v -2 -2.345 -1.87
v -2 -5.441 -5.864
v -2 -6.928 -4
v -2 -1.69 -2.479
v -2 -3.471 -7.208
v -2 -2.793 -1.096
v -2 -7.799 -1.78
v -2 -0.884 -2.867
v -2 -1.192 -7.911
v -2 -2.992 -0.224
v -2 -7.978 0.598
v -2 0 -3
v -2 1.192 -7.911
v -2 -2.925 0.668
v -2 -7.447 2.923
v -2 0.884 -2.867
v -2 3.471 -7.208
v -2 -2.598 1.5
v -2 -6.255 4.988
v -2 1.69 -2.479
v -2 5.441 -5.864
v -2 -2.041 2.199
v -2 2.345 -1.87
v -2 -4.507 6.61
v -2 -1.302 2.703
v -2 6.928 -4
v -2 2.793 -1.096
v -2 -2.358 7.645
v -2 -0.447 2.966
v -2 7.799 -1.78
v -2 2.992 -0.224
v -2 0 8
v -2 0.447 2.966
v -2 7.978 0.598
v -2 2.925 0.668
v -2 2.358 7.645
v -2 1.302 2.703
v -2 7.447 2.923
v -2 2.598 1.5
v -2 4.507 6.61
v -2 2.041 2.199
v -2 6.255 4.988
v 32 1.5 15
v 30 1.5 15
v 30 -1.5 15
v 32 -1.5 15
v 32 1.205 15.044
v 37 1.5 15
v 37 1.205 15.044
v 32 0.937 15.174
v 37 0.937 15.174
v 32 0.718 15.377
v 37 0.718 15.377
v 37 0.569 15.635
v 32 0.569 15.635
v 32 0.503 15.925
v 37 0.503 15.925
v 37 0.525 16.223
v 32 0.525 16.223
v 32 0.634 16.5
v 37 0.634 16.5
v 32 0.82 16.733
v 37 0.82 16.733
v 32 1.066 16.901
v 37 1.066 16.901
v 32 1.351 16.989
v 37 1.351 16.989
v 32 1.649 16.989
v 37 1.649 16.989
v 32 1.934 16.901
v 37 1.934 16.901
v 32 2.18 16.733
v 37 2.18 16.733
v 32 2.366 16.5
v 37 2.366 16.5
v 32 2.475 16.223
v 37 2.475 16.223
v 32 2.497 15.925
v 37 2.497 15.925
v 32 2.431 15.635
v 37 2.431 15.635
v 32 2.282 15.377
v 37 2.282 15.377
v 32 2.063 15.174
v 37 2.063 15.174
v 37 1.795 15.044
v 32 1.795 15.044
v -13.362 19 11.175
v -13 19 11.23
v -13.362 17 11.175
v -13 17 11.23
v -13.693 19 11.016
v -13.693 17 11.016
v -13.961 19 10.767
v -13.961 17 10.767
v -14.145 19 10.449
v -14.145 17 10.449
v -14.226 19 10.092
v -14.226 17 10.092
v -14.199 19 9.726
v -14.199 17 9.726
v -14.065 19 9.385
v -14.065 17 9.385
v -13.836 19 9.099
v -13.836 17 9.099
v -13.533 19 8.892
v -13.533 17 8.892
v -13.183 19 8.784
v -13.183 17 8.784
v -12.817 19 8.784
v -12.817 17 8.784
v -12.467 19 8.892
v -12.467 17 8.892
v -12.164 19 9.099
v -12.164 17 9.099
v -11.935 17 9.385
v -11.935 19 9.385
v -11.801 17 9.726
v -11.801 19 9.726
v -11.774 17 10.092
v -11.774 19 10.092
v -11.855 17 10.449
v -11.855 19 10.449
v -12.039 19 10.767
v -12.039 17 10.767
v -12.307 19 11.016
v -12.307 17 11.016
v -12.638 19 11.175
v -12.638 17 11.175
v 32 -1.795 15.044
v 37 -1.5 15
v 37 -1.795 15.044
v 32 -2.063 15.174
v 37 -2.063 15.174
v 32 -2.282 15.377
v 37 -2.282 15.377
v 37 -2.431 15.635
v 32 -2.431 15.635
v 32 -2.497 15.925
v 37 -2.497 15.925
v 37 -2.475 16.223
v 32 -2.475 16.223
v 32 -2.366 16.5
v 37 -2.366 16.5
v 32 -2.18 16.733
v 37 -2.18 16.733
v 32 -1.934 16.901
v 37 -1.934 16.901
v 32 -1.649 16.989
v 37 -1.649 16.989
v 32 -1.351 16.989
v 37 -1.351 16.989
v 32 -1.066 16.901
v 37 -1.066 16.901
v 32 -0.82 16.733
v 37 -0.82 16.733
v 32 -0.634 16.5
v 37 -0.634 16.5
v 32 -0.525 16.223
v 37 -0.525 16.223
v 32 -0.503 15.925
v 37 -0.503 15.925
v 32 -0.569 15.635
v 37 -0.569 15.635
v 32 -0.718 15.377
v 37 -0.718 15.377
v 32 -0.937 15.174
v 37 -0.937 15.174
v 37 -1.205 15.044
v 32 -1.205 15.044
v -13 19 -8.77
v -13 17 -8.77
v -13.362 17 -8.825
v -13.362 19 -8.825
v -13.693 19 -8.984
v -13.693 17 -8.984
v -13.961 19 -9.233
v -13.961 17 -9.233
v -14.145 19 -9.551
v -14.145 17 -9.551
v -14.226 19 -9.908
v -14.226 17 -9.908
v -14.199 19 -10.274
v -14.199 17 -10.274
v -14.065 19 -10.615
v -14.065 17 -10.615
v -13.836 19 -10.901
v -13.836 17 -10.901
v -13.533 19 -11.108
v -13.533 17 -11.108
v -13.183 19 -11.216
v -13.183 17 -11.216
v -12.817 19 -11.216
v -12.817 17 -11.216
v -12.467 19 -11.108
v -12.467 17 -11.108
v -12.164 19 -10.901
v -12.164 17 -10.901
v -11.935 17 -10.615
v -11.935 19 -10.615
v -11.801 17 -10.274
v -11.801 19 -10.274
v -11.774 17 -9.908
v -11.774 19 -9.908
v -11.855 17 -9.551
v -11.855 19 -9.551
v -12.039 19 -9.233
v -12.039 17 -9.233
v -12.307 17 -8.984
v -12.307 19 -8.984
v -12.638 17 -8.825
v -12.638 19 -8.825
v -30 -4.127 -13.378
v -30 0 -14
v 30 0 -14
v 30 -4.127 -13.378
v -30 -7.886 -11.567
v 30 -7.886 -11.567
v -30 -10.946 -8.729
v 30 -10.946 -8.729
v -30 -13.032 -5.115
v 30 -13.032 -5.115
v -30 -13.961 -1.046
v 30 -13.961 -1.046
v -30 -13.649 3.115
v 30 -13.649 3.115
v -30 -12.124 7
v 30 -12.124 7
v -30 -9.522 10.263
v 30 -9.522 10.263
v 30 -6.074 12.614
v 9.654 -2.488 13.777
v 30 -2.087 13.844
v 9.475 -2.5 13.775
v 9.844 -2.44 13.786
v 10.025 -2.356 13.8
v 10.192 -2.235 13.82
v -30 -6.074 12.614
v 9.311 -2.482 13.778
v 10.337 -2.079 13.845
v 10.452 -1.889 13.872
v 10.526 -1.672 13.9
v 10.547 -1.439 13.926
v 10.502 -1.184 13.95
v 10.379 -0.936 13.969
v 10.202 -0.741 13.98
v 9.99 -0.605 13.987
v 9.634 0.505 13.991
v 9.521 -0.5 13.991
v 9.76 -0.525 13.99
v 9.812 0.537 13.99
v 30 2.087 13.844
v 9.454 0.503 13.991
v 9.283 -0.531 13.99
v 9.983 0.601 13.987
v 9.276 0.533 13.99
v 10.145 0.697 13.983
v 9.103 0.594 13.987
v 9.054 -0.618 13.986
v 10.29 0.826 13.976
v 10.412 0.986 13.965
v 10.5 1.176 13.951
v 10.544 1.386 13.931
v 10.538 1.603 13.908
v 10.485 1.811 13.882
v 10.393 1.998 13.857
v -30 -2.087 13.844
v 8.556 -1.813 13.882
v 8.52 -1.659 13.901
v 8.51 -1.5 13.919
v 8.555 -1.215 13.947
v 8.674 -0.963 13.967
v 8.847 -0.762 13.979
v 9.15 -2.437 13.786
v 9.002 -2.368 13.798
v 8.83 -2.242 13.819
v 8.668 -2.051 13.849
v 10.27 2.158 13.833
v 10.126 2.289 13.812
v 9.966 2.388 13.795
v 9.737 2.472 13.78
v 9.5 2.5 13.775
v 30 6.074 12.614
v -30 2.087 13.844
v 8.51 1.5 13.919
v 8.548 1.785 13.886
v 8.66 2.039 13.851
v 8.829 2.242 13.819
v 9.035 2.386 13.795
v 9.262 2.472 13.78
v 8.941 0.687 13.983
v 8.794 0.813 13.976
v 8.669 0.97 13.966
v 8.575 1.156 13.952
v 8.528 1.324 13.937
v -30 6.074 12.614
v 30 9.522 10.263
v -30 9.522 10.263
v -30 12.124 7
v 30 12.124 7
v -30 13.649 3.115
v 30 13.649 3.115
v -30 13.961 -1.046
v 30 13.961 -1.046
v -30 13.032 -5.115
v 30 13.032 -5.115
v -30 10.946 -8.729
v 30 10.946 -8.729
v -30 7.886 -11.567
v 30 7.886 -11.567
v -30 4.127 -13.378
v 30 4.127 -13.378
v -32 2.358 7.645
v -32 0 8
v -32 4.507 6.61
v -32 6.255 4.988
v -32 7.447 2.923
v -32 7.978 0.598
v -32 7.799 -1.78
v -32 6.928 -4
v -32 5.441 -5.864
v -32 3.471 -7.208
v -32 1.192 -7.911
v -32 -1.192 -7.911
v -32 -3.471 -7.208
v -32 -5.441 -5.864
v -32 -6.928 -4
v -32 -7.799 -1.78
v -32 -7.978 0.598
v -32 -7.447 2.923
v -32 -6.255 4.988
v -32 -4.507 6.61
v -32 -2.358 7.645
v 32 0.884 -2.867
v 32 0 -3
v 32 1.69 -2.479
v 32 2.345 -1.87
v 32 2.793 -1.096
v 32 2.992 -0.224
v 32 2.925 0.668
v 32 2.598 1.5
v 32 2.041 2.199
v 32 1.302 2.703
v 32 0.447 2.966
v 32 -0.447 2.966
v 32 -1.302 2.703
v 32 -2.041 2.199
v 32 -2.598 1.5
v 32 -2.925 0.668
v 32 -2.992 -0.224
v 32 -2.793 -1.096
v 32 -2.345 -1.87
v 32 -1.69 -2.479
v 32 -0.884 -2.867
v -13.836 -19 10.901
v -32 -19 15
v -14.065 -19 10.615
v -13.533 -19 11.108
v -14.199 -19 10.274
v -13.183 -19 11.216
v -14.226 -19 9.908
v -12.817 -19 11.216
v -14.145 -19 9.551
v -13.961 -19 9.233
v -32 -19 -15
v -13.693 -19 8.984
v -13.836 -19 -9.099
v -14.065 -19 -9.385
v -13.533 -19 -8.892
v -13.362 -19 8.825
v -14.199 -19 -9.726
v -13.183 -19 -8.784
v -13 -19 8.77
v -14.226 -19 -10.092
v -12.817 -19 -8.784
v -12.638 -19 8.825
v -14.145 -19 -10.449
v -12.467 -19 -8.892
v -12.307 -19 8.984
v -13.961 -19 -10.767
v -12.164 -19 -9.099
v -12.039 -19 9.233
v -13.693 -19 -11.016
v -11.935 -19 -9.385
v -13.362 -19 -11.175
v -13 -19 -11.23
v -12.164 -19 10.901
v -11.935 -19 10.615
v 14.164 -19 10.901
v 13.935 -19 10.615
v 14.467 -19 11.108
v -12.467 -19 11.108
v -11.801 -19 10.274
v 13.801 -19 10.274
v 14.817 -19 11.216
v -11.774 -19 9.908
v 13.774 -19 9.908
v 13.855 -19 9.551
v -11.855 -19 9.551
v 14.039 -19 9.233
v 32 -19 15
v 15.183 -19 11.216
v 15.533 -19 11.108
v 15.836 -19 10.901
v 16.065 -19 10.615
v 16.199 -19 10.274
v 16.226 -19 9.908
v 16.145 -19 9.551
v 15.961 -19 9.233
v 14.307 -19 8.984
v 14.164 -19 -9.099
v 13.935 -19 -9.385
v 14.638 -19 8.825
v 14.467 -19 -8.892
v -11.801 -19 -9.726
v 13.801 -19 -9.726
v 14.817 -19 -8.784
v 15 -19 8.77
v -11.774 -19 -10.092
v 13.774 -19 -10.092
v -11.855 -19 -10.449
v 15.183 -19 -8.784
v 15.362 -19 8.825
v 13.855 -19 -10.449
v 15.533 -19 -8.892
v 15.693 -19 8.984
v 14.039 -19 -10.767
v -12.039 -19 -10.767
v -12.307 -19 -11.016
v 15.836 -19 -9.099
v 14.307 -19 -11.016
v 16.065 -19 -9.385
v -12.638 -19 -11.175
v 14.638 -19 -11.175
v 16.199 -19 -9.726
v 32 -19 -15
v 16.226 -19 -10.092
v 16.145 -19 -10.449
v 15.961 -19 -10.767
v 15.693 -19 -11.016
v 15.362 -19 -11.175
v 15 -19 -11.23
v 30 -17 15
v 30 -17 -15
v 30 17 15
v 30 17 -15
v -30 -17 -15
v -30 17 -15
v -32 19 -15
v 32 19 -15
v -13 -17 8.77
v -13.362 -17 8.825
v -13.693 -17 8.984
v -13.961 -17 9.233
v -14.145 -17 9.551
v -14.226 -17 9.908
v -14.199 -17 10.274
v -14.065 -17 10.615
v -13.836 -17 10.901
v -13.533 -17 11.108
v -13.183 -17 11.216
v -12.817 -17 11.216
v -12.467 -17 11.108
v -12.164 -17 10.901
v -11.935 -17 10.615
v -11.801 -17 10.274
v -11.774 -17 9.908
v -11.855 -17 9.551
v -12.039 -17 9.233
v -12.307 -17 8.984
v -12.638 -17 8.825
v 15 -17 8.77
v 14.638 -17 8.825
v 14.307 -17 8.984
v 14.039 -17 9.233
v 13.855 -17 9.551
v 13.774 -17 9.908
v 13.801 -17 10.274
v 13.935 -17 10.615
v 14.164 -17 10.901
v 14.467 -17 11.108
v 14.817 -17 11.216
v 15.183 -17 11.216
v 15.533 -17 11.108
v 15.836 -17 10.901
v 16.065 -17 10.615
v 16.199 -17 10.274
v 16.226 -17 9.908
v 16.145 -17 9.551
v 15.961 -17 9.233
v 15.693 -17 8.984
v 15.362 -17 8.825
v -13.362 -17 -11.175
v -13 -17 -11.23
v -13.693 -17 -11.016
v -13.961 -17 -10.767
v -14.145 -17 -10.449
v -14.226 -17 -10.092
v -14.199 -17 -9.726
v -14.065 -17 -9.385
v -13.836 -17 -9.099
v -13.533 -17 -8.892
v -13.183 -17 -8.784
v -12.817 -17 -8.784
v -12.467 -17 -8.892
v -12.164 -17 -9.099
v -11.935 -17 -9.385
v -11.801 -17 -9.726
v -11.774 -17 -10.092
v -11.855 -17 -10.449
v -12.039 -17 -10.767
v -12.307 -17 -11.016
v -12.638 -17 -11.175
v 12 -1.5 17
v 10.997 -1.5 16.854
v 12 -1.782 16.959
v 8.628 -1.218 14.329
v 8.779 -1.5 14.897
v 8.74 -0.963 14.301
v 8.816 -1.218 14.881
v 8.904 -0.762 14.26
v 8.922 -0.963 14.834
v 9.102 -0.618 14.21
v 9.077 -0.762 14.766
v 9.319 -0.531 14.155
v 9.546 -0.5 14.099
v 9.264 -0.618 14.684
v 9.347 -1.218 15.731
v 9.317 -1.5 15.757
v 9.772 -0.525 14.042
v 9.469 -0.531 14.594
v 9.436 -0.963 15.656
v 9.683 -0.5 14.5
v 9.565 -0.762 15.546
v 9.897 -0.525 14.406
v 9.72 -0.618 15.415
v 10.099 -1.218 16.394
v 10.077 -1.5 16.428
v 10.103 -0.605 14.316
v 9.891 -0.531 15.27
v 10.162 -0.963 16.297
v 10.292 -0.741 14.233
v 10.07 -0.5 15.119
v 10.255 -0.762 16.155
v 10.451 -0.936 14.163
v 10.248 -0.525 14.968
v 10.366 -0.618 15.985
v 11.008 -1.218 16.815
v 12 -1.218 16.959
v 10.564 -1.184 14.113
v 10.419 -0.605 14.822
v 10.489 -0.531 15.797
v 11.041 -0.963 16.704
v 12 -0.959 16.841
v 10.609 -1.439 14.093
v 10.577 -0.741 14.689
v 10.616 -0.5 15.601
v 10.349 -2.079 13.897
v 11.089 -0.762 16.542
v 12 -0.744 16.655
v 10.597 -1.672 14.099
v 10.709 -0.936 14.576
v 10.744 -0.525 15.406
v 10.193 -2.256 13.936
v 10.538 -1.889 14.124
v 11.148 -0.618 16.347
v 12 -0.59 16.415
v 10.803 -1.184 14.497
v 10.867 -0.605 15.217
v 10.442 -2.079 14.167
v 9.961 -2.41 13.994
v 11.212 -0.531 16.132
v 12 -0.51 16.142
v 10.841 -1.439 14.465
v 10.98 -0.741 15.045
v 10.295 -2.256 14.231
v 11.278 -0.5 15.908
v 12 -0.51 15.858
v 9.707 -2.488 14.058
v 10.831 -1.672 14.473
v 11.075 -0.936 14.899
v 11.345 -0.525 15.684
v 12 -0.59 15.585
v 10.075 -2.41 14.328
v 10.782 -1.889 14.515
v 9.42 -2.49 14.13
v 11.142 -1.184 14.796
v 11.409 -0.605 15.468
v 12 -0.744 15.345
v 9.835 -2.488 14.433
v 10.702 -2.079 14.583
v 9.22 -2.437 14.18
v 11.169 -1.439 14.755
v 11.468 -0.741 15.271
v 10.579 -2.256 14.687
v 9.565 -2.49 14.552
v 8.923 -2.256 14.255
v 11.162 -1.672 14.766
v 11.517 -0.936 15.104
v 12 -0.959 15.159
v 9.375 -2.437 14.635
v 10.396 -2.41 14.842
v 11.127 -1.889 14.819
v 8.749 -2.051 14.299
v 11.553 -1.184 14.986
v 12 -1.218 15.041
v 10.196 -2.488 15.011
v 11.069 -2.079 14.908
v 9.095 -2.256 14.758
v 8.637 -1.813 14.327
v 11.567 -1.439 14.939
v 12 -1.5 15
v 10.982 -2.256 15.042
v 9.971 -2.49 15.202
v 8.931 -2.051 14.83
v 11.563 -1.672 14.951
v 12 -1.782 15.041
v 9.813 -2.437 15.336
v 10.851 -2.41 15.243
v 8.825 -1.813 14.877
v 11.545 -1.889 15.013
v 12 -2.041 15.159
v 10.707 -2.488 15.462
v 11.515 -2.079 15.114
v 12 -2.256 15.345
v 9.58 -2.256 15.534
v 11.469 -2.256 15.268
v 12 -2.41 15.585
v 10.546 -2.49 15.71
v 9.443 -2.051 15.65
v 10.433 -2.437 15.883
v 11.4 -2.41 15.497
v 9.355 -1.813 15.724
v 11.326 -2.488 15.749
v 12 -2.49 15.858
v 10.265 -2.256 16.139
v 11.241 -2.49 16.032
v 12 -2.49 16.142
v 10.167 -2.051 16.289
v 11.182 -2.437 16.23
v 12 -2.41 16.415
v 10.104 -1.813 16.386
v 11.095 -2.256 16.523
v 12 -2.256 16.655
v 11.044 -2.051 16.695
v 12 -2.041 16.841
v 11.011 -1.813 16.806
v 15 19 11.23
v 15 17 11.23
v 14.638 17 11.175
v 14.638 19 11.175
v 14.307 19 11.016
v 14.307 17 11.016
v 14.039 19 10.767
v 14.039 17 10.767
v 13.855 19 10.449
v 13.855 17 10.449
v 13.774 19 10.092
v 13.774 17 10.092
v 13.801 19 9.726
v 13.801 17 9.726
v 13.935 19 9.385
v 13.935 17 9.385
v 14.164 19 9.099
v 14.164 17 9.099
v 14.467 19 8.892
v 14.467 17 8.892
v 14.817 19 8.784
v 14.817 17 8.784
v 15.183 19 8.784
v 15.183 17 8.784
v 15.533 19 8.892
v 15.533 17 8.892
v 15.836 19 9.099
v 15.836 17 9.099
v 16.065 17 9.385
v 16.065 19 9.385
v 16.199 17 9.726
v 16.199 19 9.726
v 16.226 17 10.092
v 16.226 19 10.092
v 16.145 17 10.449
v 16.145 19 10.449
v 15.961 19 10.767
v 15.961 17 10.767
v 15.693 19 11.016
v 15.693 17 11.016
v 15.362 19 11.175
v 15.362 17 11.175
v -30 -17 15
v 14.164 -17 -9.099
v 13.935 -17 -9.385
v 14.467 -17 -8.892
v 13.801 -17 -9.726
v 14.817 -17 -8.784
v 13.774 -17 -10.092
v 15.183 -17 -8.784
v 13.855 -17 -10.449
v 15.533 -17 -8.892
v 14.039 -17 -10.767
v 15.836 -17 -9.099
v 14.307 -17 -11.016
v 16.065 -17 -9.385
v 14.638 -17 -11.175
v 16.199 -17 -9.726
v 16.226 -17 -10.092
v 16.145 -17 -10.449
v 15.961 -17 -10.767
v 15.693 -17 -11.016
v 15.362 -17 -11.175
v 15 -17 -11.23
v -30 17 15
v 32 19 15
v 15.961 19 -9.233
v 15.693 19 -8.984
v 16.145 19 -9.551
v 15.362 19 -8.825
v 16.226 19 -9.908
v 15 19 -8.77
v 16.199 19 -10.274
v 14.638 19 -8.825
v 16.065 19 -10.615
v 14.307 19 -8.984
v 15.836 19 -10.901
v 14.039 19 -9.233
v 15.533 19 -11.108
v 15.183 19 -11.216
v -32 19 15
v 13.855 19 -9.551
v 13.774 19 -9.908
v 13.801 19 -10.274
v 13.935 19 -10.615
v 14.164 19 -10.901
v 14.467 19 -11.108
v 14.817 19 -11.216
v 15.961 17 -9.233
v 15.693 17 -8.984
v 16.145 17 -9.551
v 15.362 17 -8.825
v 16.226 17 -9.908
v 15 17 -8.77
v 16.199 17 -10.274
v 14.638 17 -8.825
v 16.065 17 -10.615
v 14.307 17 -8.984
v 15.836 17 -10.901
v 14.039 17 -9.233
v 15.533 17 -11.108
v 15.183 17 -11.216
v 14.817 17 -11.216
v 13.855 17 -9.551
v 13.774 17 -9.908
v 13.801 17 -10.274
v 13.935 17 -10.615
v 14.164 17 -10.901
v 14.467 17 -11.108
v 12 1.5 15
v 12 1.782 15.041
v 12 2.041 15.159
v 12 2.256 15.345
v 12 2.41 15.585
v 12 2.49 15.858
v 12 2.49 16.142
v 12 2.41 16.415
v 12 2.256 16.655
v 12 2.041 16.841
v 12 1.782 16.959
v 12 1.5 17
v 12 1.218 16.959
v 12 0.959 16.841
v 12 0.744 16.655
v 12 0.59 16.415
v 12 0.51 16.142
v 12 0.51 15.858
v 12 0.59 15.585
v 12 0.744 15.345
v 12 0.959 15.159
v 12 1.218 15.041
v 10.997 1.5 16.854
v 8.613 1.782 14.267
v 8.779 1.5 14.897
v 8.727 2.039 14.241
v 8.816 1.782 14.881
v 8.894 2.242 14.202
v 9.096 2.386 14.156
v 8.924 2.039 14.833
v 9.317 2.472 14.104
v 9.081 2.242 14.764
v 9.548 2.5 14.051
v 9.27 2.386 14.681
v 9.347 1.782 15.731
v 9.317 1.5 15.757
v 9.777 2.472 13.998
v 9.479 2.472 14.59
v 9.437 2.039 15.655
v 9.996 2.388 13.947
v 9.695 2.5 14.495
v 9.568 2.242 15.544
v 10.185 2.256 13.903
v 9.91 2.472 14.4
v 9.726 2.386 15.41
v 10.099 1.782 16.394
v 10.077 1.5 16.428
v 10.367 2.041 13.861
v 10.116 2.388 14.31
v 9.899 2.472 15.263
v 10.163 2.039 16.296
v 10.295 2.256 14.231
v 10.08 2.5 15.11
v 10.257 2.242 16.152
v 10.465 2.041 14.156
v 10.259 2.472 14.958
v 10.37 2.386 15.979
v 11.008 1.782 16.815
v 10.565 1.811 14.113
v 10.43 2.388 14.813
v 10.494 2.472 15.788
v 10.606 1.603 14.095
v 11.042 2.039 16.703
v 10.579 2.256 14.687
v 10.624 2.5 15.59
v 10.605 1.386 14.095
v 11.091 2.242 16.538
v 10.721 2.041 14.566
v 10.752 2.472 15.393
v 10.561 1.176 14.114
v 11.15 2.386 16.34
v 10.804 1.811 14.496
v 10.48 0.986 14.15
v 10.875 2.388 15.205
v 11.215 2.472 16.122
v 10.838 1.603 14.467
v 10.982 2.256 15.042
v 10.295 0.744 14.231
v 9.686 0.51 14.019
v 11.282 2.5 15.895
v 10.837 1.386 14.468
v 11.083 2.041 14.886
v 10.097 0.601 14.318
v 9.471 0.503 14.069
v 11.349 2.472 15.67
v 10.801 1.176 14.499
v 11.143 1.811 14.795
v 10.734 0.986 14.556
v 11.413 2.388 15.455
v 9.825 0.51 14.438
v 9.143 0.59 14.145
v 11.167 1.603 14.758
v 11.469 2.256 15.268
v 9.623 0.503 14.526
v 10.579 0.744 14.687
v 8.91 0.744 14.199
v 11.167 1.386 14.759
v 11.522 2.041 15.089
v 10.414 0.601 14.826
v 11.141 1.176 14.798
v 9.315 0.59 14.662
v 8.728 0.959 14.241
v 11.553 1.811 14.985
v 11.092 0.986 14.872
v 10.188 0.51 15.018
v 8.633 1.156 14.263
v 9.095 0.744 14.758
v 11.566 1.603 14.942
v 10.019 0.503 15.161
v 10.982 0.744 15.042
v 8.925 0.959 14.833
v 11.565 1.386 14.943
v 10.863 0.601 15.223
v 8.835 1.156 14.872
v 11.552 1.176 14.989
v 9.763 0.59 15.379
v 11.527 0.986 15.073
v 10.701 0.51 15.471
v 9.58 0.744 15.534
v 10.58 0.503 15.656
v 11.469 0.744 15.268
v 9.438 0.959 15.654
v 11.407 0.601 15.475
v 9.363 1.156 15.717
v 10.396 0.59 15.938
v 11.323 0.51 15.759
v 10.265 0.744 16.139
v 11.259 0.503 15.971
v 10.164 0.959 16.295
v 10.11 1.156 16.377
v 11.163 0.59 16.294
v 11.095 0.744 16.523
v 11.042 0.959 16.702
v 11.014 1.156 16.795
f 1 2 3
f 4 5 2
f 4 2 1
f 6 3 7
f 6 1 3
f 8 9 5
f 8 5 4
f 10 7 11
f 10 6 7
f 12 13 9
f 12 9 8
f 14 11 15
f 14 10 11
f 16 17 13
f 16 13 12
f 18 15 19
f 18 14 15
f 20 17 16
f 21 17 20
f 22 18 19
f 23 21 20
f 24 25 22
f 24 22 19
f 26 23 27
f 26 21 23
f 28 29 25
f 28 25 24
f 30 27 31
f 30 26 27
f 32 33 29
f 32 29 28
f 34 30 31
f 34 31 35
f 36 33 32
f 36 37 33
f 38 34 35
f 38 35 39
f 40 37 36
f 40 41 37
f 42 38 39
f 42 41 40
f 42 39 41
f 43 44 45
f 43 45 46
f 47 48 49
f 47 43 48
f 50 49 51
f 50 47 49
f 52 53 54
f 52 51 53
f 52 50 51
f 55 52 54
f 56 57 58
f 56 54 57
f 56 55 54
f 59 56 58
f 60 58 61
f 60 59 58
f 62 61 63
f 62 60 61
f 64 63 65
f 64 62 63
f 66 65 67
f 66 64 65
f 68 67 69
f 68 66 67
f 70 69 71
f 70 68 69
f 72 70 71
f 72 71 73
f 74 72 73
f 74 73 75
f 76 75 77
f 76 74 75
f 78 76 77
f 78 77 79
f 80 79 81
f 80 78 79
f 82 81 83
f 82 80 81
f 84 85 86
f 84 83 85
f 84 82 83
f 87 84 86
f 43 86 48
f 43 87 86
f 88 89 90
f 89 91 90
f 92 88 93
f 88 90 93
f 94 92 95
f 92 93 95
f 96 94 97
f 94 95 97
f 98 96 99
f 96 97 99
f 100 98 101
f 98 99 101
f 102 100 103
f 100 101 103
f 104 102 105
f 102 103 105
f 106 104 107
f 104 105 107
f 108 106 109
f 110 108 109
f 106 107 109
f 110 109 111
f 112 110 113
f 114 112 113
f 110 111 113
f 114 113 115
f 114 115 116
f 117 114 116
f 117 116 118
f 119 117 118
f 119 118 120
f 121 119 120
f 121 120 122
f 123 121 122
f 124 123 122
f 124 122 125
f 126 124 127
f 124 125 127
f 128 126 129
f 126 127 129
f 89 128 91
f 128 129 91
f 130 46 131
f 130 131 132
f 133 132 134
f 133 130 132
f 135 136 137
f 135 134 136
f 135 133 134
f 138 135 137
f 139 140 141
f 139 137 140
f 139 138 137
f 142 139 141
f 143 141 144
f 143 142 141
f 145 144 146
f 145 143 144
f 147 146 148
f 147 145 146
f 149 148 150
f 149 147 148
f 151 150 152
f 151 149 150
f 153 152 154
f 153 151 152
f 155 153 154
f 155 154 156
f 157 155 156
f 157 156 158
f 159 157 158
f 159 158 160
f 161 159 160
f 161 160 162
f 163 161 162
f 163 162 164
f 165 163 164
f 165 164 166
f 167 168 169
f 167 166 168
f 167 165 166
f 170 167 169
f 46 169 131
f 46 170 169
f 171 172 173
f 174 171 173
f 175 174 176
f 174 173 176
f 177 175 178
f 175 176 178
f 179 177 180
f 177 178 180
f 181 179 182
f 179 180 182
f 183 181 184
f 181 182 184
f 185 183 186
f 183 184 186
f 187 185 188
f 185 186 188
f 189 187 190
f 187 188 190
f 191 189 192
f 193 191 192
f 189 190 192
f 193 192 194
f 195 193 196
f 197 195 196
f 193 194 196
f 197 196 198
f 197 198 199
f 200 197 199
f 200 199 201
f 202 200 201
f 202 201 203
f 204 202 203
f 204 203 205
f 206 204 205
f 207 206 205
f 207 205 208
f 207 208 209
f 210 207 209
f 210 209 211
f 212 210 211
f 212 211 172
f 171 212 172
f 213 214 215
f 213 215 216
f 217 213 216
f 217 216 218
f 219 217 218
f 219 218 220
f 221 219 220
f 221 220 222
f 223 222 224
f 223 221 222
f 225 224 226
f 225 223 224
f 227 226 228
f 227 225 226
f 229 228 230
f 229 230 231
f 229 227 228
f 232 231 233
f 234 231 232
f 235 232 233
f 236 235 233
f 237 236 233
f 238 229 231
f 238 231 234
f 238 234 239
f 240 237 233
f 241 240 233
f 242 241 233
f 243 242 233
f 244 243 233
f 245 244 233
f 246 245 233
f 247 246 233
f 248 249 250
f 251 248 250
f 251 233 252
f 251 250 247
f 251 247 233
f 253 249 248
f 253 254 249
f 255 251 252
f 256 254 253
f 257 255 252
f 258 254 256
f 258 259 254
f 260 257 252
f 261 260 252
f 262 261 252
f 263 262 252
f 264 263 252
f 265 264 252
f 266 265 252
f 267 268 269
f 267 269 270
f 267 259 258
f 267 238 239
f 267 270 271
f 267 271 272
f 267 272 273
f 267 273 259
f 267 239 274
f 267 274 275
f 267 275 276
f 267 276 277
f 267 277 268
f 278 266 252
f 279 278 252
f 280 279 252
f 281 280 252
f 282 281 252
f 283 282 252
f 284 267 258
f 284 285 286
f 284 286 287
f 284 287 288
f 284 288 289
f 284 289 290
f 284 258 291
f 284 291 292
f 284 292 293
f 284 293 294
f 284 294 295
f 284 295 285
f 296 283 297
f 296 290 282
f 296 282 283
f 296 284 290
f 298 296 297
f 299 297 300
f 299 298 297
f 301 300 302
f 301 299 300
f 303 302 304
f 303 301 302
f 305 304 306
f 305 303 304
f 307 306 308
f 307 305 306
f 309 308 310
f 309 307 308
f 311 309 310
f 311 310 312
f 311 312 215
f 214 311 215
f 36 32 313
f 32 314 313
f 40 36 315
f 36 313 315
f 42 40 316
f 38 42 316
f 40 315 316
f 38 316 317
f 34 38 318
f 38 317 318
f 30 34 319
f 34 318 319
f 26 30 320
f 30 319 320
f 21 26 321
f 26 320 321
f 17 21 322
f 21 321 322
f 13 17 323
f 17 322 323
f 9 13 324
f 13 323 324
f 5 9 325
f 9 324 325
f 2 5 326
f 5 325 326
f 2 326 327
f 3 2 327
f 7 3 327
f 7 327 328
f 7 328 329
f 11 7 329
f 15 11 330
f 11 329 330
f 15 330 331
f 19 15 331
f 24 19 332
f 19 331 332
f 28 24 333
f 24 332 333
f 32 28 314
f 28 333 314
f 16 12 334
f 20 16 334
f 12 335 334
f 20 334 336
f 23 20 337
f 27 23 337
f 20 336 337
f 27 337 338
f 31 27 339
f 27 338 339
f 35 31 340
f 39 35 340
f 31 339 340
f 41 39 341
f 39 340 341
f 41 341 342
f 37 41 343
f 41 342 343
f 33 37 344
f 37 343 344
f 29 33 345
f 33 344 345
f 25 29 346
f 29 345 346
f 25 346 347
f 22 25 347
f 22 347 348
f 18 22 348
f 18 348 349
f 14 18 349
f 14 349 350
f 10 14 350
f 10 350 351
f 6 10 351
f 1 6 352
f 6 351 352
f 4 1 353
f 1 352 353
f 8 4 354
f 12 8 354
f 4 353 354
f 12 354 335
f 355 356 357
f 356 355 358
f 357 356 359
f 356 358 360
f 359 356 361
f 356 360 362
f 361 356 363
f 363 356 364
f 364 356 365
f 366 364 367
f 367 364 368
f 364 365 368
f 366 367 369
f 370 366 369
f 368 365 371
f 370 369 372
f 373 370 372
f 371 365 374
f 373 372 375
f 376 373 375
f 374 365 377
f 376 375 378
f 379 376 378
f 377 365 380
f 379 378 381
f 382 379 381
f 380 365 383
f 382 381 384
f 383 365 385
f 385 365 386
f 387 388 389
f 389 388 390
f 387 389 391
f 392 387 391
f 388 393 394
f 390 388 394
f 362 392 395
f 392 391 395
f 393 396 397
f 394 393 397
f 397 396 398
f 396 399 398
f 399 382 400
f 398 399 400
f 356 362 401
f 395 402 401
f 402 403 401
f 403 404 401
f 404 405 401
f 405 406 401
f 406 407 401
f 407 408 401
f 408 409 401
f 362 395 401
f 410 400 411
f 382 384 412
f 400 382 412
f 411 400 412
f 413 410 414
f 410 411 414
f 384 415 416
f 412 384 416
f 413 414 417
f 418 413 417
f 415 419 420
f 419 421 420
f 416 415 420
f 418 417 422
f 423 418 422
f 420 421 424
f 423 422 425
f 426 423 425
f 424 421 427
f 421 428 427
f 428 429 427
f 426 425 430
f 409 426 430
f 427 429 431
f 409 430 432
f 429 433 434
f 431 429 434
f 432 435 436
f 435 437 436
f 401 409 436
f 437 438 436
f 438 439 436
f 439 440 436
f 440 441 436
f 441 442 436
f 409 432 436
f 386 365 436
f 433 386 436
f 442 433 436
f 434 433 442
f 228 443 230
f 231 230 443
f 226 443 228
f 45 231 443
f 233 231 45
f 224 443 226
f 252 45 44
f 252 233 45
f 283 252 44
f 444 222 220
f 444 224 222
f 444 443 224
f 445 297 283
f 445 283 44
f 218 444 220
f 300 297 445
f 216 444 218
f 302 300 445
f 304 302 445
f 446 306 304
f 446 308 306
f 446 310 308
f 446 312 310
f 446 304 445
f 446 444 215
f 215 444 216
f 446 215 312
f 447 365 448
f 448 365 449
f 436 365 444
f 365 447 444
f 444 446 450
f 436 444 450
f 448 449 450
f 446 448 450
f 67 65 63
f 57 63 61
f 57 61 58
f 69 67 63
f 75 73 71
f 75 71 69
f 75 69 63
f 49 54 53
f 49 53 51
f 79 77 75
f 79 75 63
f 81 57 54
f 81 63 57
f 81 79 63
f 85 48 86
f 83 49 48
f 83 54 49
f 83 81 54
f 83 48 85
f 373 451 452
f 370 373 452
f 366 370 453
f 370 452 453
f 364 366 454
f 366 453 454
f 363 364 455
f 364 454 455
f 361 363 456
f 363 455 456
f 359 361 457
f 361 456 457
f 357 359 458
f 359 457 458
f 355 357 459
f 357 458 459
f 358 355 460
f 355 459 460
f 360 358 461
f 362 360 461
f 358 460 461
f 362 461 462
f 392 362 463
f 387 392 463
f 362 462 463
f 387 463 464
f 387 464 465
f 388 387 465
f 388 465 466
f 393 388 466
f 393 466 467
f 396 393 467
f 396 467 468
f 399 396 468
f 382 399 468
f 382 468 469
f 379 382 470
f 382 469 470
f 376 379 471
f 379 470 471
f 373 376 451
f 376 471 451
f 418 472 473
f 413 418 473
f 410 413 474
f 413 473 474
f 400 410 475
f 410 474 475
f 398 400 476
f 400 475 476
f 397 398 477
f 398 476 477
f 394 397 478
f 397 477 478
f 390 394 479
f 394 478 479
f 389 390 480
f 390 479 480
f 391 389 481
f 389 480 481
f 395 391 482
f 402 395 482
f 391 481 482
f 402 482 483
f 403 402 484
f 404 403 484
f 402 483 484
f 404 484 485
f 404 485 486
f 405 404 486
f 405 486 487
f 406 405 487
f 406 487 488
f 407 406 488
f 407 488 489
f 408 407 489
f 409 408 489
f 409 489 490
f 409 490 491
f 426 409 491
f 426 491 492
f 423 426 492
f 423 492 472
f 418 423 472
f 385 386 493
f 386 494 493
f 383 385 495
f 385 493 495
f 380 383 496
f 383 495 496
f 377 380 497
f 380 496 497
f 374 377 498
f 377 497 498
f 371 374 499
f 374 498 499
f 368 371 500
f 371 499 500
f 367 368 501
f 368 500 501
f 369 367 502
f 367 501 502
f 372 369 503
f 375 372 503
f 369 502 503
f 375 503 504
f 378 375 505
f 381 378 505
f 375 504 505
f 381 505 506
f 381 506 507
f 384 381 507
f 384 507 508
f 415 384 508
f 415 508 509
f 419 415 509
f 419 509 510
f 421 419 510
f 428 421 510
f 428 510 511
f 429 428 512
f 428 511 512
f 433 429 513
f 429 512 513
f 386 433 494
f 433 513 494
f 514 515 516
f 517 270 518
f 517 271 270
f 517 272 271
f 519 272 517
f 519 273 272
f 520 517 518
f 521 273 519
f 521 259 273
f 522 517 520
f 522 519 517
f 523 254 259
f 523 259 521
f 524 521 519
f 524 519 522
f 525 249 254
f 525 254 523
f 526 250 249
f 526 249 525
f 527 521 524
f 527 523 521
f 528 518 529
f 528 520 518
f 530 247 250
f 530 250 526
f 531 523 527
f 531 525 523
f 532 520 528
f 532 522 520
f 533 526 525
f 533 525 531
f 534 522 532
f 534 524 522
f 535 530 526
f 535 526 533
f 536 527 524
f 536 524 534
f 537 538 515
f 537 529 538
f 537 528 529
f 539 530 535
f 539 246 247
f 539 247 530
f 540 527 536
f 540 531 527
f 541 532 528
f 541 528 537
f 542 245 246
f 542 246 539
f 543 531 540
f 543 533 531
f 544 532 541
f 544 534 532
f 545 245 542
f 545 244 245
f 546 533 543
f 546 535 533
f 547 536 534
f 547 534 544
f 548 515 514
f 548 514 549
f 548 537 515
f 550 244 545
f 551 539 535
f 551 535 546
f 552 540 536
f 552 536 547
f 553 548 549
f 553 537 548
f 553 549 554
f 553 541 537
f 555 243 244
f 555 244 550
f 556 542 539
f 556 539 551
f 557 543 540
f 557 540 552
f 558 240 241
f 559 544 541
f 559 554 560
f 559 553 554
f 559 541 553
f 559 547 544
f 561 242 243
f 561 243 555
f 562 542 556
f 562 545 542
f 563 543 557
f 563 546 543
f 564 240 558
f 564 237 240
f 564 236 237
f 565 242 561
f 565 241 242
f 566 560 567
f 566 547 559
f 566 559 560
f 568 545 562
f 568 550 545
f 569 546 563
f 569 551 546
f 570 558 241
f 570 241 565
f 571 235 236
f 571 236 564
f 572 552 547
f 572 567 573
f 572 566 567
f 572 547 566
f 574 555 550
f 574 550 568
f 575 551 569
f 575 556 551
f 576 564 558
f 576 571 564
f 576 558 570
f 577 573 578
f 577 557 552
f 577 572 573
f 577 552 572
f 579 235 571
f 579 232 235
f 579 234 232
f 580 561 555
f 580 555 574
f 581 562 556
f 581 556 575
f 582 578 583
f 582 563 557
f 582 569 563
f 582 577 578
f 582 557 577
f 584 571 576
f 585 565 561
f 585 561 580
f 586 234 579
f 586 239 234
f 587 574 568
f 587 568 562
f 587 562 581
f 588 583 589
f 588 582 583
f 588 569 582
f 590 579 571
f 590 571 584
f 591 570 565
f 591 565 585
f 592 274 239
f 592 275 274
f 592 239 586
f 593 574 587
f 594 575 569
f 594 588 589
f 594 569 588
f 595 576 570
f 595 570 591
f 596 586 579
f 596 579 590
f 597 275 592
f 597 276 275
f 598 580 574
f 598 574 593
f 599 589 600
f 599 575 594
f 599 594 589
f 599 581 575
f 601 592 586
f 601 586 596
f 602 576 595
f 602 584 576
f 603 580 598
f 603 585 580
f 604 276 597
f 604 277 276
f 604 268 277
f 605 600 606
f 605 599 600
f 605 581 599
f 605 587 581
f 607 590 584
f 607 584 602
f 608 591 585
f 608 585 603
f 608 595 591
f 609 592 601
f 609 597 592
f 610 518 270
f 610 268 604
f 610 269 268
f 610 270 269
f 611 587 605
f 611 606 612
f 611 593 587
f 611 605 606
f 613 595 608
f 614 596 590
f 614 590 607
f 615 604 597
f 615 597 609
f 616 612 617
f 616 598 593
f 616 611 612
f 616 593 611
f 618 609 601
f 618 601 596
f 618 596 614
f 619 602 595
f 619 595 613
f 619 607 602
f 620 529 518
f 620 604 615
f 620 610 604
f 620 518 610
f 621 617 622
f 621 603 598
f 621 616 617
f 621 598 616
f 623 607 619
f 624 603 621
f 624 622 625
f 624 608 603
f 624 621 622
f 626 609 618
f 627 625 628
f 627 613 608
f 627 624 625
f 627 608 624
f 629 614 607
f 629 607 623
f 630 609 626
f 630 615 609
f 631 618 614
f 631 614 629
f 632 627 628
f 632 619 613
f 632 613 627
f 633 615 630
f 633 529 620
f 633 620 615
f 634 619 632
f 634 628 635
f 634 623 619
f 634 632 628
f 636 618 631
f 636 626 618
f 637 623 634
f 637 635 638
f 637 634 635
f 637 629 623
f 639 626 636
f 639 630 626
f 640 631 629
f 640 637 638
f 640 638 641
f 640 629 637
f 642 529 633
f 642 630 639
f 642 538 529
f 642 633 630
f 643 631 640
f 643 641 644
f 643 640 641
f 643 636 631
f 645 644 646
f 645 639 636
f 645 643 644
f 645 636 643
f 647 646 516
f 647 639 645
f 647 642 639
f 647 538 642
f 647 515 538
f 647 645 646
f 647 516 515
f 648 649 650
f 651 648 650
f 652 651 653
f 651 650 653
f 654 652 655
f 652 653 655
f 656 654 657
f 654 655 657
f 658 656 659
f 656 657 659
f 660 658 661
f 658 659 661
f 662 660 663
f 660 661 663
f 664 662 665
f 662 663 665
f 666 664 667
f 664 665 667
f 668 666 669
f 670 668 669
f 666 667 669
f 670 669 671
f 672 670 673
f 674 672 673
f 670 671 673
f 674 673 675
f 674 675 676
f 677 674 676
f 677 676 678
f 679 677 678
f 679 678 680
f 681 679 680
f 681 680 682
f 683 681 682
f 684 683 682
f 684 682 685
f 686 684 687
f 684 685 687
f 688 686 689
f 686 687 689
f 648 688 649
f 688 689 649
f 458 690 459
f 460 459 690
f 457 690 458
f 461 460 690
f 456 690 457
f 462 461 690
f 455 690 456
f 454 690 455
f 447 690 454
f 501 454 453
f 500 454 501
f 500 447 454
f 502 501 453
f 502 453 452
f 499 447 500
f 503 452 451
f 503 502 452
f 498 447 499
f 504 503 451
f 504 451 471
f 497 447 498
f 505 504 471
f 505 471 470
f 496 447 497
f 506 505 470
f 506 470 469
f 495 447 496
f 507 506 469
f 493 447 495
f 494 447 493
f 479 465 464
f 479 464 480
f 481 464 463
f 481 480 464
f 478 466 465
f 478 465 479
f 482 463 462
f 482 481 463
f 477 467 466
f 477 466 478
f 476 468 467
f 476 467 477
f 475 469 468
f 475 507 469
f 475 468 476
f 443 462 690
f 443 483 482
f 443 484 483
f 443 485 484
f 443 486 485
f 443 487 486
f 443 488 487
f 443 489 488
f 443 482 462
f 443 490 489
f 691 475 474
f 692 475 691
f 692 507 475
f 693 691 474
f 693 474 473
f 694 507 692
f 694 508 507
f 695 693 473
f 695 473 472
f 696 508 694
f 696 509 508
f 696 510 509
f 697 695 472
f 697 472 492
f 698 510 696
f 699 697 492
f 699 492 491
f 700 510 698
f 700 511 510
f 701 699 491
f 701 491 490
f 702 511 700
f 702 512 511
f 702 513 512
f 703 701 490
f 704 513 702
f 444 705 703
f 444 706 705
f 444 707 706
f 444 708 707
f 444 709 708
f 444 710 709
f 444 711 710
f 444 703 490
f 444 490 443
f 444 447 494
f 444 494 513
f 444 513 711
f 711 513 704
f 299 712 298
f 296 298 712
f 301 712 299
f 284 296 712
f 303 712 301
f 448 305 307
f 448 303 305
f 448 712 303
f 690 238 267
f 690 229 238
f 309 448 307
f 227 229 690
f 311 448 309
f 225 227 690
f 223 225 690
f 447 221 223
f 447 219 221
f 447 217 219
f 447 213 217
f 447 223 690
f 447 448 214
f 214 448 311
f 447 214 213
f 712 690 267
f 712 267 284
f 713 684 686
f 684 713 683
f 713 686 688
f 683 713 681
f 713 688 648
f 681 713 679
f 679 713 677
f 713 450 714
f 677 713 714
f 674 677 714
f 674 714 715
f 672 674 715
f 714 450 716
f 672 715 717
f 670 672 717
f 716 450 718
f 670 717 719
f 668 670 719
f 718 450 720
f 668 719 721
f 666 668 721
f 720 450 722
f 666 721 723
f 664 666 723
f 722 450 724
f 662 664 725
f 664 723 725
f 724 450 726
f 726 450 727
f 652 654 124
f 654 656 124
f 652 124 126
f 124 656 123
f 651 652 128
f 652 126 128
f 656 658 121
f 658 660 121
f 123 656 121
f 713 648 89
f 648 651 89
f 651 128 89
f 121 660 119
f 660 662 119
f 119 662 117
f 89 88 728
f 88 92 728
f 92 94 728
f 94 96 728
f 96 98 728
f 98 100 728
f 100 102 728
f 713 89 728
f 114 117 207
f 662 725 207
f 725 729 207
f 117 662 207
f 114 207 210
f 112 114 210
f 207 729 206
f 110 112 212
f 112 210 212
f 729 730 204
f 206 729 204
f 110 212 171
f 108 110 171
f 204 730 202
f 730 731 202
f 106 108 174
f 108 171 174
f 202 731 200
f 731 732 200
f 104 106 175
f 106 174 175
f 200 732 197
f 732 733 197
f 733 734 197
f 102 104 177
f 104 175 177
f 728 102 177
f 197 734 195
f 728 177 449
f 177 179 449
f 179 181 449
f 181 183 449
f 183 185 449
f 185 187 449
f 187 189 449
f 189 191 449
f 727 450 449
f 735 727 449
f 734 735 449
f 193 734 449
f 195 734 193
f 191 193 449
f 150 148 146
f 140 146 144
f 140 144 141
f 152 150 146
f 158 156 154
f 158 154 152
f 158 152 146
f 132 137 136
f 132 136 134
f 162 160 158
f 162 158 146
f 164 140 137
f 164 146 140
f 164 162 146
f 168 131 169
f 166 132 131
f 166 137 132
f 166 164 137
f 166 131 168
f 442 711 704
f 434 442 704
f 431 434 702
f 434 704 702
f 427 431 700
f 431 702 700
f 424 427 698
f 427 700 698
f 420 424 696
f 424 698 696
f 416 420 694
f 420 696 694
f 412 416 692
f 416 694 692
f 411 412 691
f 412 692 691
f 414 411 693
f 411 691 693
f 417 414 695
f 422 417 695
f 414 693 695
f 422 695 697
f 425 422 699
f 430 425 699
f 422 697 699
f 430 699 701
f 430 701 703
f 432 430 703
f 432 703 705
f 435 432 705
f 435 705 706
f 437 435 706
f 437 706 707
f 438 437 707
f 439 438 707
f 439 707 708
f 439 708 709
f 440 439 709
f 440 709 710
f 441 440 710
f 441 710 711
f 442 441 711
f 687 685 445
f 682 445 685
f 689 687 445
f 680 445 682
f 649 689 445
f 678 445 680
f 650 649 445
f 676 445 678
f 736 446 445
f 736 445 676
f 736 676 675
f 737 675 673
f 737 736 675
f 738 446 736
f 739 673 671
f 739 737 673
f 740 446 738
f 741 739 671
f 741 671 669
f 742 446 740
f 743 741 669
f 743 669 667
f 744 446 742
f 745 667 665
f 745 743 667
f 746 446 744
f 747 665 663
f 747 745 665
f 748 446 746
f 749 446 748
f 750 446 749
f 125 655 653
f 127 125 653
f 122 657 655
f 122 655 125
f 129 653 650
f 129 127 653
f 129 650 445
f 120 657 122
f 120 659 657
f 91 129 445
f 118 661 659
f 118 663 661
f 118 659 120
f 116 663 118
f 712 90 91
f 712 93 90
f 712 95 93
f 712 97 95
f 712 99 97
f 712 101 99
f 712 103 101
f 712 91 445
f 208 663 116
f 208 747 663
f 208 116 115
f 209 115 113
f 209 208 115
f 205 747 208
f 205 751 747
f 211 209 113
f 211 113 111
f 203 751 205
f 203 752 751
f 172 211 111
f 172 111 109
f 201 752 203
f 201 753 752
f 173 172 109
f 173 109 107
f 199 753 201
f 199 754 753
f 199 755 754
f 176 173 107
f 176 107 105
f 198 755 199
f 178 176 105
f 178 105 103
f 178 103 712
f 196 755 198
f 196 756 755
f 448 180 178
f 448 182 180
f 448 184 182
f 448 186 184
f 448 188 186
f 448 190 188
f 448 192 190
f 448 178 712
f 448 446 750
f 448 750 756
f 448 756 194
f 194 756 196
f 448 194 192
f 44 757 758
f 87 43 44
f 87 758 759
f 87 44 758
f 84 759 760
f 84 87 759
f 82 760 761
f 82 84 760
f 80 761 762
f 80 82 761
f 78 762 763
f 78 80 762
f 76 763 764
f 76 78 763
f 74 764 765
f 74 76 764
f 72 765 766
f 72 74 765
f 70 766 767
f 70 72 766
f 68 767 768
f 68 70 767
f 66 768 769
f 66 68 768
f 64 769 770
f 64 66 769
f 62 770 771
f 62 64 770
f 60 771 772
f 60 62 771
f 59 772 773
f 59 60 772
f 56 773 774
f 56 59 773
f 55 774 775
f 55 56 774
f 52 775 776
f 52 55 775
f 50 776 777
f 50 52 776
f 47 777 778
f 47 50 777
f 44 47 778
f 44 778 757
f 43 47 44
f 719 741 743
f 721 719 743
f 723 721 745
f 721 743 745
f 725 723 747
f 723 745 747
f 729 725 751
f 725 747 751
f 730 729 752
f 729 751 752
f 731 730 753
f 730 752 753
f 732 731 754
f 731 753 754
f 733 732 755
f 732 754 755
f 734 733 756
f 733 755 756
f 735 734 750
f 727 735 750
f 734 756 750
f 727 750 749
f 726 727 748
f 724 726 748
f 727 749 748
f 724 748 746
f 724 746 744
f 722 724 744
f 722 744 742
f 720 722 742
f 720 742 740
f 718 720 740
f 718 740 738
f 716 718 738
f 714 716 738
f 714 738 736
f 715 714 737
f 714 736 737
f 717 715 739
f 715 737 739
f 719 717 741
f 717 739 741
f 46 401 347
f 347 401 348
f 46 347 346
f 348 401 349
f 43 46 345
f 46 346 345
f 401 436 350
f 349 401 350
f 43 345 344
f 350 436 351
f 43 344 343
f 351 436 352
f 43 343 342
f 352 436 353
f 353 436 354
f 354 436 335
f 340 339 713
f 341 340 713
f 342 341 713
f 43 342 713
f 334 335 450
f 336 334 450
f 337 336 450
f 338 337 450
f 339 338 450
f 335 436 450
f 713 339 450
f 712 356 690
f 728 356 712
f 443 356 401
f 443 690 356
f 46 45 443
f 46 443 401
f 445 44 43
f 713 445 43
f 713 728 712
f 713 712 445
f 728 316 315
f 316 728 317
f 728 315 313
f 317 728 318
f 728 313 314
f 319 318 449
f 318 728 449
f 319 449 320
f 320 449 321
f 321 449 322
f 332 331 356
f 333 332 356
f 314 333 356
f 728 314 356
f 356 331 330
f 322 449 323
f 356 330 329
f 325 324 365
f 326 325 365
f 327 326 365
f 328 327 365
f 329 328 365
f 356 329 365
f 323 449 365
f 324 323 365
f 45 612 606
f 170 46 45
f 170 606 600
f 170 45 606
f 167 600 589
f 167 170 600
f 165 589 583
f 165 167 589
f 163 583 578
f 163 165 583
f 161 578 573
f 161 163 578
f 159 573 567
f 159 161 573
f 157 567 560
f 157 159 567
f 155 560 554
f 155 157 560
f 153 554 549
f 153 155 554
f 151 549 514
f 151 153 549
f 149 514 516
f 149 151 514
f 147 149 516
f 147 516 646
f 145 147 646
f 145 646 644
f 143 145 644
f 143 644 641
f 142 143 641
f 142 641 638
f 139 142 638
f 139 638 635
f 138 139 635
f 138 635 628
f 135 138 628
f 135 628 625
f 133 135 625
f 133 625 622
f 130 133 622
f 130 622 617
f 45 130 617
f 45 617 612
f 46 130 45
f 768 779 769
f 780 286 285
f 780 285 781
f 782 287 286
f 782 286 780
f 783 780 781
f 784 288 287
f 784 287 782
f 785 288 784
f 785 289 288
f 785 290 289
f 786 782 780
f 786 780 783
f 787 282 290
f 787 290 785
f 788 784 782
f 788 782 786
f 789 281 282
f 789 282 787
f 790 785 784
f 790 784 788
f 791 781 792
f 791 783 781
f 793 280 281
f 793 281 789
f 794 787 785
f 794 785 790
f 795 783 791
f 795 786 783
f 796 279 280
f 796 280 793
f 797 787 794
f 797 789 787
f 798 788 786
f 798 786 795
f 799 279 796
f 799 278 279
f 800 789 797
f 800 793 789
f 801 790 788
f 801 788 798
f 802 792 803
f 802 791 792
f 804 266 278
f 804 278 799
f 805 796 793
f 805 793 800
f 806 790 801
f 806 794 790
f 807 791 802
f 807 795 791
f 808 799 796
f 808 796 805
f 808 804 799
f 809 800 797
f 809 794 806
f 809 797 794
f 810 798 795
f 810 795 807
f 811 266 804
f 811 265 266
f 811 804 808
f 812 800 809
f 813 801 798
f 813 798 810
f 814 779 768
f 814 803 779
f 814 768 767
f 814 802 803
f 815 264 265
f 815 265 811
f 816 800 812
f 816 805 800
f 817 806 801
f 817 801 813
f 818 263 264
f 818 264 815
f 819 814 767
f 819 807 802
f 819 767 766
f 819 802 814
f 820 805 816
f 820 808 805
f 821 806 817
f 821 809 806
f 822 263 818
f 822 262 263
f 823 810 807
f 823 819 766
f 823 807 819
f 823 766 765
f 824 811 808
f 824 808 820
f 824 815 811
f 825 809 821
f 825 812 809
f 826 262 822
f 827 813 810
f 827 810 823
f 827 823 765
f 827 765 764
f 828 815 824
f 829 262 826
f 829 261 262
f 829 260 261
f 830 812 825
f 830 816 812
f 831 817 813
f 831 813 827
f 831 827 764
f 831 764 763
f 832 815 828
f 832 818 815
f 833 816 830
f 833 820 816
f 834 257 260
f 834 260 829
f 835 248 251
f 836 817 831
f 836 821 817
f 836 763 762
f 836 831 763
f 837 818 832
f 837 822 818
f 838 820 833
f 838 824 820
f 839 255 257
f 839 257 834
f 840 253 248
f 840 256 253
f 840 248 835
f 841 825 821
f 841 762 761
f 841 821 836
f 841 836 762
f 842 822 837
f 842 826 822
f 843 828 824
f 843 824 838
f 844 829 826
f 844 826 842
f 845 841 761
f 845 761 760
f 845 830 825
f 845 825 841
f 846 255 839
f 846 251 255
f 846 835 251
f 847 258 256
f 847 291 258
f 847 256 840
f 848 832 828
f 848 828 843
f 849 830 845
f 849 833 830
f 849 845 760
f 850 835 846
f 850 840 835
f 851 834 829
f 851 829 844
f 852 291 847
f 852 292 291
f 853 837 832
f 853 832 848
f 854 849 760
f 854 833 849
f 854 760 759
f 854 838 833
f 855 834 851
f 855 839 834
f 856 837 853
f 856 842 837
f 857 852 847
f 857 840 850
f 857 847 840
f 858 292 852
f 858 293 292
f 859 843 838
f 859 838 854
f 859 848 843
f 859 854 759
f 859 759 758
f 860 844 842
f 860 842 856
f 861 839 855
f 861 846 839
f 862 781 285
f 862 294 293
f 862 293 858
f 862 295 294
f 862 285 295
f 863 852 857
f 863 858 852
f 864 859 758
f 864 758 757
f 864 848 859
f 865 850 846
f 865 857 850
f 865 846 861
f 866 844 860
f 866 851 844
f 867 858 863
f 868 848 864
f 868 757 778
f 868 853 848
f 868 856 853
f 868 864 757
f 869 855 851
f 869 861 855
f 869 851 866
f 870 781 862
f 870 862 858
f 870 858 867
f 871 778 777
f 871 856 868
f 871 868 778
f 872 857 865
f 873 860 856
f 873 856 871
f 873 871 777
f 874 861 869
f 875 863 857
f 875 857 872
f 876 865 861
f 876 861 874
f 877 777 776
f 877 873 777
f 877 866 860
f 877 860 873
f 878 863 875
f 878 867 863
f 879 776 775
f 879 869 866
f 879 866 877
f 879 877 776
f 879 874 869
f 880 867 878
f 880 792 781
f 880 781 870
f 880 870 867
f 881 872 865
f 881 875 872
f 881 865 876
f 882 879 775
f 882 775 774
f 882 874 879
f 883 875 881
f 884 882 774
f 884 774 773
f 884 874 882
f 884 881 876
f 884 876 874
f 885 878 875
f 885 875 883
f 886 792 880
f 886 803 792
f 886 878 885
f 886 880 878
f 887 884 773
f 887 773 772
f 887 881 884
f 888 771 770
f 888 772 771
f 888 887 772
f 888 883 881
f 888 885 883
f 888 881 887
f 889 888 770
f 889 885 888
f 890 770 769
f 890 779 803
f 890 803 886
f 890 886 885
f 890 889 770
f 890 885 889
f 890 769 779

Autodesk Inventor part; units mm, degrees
ref_plane "YZ Plane" through (0, 0, 0) normal (1, 0, 0) x (0, 1, 0)
ref_plane "XZ Plane" through (0, 0, 0) normal (0, 1, 0) x (-1, 0, 0)
ref_plane "XY Plane" through (0, 0, 0) normal (0, 0, 1) x (1, 0, 0)
sketch "Skizze1" plane through (0, 0, 0) normal (0, 0, 1) x (1, 0, 0)
  line L0 (-30, -17) -> (30, -17)
  line L1 (30, -17) -> (30, 17)
  line L2 (30, 17) -> (-30, 17)
  line L3 (-30, 17) -> (-30, -17)
  line L4 (-30, -17) -> (30, 17) construction
  line L5 (30, -17) -> (-30, 17) construction
  line L6 (-32, -19) -> (32, -19)
  line L7 (32, -19) -> (32, 19)
  line L8 (32, 19) -> (-32, 19)
  line L9 (-32, 19) -> (-32, -19)
  line L10 (-32, -19) -> (32, 19) construction
  line L11 (32, -19) -> (-32, 19) construction
  point P0 (0, 0)
  dimension "d0" = 38
  dimension "d1" = 64
  dimension "d2" = 2
  dimension "d3" = 2
extrude "Extrusion1" add sketch "Skizze1" along normal mid plane 30
sketch "Skizze2" plane through (-30, -17, -15) normal (1, 0, 0) x (0, 0, -1)
  circle A0 centre (-15, 17) radius 14
  dimension "d6" = 28
extrude "Extrusion2" add sketch "Skizze2" along normal up to next
sketch "Skizze3" plane through (32, -19, 15) normal (1, 0, 0) x (0, 0, -1)
  circle A0 centre (15, 19) radius 3
  dimension "d9" = 6
extrude "Extrusion3" cut sketch "Skizze3" against normal through all
sketch "Skizze4" plane through (-32, -19, 15) normal (-1, 0, 0) x (0, 0, 1)
  circle A0 centre (-15, 19) radius 8
  dimension "d12" = 16
extrude "Extrusion4" cut sketch "Skizze4" against normal blind 30
sketch "Skizze5" plane through (-32, 19, 15) normal (0, 1, 0) x (1, 0, 0)
  line L0 (19, 5) -> (47, 5)
  line L1 (47, 5) -> (47, 25)
  line L2 (47, 25) -> (19, 25)
  line L3 (19, 25) -> (19, 5)
  line L4 (19, 5) -> (47, 25) construction
  line L5 (47, 5) -> (19, 25) construction
  line L6 (64, 30) -> (64, 0) projected
  point P0 (32, 15)
  point P1 (33, 15)
  point P2 (33, 15)
  dimension "d15" = 28
  dimension "d16" = 20
  dimension "d17" = 17
hole "Bohrung1" at (-13, 19, -10) at (15, 19, -10) at (15, 19, 10) at (-13, 19, 10) direction (0, -1, 0) diameter 2.459 depth 2 thread size "M3x0.5" class "6H" standard "ISO Metric profile"
sketch "Skizze6" plane through (-32, -19, 15) normal (0, -1, 0) x (1, 0, 0)
  circle A0 centre (47, -5) radius 1.2295 projected
  circle A1 centre (19, -25) radius 1.2295 projected
  circle A2 centre (47, -25) radius 1.2295 projected
  circle A3 centre (19, -5) radius 1.2295 projected
  line L0 (2, -30) -> (2, 0) projected
  line L1 (62, -30) -> (2, -30) projected
  line L2 (62, -30) -> (62, 0) projected
  line L3 (2, 0) -> (62, 0) projected
  point P0 (32, -15)
hole "Bohrung2" at (-13, -19, 10) at (-13, -19, -10) at (15, -19, -10) at (15, -19, 10) direction (0, 1, 0) diameter 2.459 depth 2 thread size "M3x0.5" class "6H" standard "ISO Metric profile"
sketch "Skizze7" plane through (32, -19, 15) normal (1, 0, 0) x (0, 0, -1)
  circle A0 centre (-1, 20.5) radius 1
  circle A1 centre (-1, 17.5) radius 1
  line L0 (0, 0) -> (0, 38) projected
  line L1 (36.4, 19) -> (-8.4, 19) projected
  point P0 (15, 19)
  dimension "d32" = 2
  dimension "d34" = 3
  dimension "d35" = 1
extrude "Extrusion5" add sketch "Skizze7" along normal blind 5 and the other way blind 20
sketch "Skizze8" plane through (12, 1.5, 16) normal (-1, 0, 0) x (0, 0, 1)
  circle A0 centre (0, -3) radius 1 projected
  circle A1 centre (0, 0) radius 1 projected
  circle A2 centre (0, -3) radius 1
  circle A3 centre (0, 0) radius 1
  circle A4 centre (-16, -1.5) radius 14 projected
  line L0 (-2.5175, -5.2711) -> (-2.5175, 7.0646)
  point P0 (-16, -1.5)
revolve "Umdrehung1" add sketch "Skizze8" angle 90 about axis through (12, -3.7711, 13.4825) along (0, -1, 0) contours A0 | A1
sketch "Skizze9" plane through (37, 1.5, 16) normal (1, 0, 0) x (0, 0, -1)
  circle A0 centre (0, 0) radius 1 projected
sketch "Skizze10" plane through (37, -1.5, 16) normal (1, 0, 0) x (0, 0, -1)
  circle A0 centre (0, 0) radius 1 projected
properties part number "Korper"
